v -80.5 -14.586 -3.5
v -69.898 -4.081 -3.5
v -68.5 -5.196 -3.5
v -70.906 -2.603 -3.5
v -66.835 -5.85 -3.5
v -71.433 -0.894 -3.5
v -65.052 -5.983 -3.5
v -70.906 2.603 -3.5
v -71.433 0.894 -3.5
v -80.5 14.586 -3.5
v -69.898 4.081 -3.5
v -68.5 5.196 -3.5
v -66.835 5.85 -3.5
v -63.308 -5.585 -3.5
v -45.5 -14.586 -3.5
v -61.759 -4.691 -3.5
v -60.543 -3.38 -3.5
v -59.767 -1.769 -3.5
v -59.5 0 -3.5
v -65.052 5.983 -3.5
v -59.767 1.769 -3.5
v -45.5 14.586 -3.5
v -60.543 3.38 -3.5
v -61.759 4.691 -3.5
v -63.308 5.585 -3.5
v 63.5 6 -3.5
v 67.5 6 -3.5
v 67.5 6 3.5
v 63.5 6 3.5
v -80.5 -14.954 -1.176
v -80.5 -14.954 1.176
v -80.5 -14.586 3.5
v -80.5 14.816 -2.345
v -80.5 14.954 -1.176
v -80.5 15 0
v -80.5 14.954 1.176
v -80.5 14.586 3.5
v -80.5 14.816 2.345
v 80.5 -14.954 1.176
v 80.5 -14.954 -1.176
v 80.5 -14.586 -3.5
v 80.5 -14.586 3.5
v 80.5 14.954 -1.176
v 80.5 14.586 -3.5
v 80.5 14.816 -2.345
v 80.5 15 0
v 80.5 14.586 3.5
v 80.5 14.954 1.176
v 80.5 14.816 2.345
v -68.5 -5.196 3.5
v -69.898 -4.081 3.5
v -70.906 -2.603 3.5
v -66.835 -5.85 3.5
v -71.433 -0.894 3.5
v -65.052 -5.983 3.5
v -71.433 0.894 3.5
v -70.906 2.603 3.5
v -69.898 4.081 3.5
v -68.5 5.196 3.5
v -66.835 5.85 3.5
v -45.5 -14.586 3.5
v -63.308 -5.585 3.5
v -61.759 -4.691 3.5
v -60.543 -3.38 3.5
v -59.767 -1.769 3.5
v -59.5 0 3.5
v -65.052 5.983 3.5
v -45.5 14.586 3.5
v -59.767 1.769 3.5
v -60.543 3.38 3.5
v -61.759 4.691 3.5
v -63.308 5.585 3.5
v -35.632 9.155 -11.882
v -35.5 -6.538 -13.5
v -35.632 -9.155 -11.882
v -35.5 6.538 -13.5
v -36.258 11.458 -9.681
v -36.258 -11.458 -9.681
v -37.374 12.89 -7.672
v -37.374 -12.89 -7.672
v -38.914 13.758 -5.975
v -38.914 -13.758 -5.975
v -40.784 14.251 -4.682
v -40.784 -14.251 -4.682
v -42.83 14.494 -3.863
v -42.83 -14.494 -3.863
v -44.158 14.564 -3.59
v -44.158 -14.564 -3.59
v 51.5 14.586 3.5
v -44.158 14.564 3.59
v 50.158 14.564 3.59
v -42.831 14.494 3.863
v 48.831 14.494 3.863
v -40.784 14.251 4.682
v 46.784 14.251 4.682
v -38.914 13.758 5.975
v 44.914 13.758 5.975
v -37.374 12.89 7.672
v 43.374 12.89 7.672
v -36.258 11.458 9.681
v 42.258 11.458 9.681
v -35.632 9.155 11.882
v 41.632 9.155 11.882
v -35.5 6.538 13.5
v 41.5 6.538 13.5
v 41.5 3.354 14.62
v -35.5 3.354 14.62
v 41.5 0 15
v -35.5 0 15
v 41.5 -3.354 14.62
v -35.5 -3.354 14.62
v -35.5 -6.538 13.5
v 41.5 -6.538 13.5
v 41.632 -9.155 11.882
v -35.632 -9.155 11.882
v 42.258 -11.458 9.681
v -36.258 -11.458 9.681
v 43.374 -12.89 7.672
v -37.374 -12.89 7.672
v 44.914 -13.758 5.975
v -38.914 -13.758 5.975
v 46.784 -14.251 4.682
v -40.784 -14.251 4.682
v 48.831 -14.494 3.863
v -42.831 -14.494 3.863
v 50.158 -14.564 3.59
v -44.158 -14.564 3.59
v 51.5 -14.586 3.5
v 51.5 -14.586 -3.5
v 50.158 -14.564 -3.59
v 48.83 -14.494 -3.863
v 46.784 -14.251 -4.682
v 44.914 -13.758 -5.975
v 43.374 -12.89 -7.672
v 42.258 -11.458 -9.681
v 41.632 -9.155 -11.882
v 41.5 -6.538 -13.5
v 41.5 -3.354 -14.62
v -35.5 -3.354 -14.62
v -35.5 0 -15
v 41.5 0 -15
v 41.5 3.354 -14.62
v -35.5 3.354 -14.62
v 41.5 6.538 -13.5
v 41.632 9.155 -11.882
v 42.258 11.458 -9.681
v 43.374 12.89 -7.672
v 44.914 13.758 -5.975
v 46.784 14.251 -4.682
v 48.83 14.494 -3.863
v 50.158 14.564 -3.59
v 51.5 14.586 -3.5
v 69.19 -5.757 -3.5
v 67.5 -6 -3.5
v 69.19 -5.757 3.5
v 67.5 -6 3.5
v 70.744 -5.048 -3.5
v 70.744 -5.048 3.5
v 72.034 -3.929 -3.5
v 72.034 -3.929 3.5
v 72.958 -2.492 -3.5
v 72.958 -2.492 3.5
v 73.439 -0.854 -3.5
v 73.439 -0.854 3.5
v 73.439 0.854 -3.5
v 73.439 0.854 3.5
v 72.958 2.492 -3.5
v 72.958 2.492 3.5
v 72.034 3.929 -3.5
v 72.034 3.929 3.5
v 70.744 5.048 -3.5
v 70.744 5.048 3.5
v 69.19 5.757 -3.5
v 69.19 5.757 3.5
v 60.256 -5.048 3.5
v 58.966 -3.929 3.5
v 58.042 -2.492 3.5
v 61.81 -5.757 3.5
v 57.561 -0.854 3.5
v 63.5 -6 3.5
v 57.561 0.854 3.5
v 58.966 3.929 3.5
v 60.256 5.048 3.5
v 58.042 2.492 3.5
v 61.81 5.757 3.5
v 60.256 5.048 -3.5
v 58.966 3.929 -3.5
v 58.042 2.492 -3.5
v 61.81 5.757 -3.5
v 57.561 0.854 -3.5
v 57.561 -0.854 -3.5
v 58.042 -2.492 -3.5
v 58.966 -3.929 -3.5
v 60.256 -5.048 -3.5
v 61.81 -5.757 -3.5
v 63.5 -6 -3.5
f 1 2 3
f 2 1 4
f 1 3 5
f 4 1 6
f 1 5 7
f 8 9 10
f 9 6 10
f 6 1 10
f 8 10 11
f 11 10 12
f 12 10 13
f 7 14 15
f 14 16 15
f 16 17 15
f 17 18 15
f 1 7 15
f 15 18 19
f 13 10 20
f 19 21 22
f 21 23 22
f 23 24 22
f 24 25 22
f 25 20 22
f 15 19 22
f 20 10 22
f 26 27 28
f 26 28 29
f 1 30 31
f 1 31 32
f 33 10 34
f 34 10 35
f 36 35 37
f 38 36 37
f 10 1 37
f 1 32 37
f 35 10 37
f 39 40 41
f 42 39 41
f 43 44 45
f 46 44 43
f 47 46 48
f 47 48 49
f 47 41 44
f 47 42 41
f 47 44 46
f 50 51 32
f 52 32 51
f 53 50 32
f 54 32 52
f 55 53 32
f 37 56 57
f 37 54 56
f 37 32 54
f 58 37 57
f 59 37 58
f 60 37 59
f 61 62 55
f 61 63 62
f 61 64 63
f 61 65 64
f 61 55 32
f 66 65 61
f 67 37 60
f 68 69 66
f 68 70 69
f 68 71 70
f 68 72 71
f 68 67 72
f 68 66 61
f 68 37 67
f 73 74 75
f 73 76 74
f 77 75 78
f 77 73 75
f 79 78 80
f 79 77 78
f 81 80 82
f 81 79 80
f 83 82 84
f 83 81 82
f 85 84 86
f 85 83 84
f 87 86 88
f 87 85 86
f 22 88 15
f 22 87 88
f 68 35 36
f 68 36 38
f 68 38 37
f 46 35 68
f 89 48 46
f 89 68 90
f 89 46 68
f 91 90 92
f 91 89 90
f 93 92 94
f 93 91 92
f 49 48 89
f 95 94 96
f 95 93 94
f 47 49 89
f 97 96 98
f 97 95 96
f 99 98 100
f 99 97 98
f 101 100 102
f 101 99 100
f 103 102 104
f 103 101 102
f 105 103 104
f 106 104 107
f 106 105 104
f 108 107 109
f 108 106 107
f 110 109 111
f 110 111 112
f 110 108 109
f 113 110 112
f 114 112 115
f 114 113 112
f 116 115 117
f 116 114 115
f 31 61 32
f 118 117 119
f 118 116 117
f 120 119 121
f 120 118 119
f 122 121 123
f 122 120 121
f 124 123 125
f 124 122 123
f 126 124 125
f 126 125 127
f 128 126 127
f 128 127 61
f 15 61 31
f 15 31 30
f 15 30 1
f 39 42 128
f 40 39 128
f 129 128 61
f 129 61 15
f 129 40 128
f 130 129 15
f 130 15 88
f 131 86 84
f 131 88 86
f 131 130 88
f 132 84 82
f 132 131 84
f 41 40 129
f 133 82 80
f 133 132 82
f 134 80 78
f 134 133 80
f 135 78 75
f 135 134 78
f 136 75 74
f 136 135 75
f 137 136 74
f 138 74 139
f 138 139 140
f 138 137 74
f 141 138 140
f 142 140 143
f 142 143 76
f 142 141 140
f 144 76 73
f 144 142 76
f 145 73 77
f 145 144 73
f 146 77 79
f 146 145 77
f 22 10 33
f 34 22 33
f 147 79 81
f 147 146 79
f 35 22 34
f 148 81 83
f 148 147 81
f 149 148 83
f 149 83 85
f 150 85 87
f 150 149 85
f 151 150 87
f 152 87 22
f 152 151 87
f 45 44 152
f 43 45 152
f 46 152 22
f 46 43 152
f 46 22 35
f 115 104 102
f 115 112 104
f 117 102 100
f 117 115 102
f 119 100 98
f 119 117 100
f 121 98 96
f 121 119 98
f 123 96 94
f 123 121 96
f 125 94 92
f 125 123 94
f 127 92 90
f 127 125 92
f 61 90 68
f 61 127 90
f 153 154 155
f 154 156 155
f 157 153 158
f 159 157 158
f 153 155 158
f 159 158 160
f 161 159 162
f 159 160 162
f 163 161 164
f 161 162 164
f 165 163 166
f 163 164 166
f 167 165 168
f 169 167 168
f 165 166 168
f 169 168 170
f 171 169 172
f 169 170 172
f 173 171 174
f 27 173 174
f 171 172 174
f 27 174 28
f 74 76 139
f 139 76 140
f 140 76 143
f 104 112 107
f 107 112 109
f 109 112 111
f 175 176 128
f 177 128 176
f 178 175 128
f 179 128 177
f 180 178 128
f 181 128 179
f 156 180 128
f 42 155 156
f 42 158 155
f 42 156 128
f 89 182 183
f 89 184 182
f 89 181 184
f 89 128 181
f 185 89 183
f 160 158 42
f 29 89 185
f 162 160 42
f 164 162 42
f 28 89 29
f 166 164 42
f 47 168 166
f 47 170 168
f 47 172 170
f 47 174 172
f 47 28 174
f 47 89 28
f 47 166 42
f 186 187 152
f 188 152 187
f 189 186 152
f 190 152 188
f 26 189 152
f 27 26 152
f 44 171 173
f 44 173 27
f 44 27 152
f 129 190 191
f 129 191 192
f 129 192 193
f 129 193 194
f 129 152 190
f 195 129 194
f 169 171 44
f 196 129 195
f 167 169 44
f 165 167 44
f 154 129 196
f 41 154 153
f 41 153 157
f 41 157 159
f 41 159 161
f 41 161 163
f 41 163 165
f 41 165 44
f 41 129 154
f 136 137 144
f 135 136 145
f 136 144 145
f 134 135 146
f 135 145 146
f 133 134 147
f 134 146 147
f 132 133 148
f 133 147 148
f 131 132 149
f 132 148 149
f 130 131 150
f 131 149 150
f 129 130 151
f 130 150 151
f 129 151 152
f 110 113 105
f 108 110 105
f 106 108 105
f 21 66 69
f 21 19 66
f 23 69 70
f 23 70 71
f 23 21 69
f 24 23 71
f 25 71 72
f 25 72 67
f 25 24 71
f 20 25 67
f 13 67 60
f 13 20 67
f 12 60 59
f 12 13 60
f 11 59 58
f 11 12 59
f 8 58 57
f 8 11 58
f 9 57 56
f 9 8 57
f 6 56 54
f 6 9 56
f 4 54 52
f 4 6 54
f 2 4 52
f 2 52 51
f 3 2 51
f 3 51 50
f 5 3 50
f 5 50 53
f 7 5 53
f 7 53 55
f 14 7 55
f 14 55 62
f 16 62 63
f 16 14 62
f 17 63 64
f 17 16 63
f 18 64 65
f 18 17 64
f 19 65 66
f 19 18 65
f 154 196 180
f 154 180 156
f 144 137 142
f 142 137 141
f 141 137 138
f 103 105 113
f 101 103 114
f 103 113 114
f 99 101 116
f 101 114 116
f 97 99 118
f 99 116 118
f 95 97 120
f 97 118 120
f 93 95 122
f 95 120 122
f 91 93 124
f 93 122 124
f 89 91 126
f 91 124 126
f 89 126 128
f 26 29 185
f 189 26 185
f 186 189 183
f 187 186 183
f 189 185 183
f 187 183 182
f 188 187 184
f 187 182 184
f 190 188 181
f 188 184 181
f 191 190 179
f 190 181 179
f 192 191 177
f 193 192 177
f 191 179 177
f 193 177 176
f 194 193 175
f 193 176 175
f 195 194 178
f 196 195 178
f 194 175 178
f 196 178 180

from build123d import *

# Parameters (mm, degrees)
F0_R     = 15
F1_DEPTH = 80.5
F2_W     = 45
F2_H     = 11.5
F2_W_2   = 39
F3_DEPTH = 15
F4_R     = 10
F5_R     = 6
F6_DEPTH = 3.5


with BuildPart() as f1:
    # F0 (on Right) → F1 (new body, symmetric)
    with BuildSketch(Plane.YZ):
        Circle(F0_R)
    extrude(amount=F1_DEPTH, both=True)

    # F2 (on Front) → F3 (cut, symmetric)
    with BuildSketch(Plane.XZ):
        with Locations((-58, 9.25)):
            Rectangle(F2_W, F2_H)
        with Locations((-58, -9.25)):
            Rectangle(F2_W, F2_H)
        with Locations((61, 9.25)):
            Rectangle(F2_W_2, F2_H)
        with Locations((61, -9.25)):
            Rectangle(F2_W_2, F2_H)
    extrude(amount=F3_DEPTH, both=True, mode=Mode.SUBTRACT)

    # F4
    f4_edges = [f1.edges().sort_by_distance(p)[0] for p in [
        (41.5, 0, 3.5),
        (-35.5, 0, 3.5),
        (41.5, 0, -3.5),
        (-35.5, 0, -3.5),
    ]]
    fillet(f4_edges, radius=F4_R)

    # F5 (on Top) → F6 (cut, symmetric)
    with BuildSketch(Plane.XY):
        with Locations((-65.5, 0)):
            Circle(F5_R)
        with BuildLine():
            Line((67.5, 6), (63.5, 6))
            ThreePointArc((63.5, 6), (57.5, 0), (63.5, -6))
            Line((63.5, -6), (67.5, -6))
            ThreePointArc((67.5, -6), (73.5, 0), (67.5, 6))
        make_face()
    extrude(amount=F6_DEPTH, both=True, mode=Mode.SUBTRACT)


solid = f1.part
